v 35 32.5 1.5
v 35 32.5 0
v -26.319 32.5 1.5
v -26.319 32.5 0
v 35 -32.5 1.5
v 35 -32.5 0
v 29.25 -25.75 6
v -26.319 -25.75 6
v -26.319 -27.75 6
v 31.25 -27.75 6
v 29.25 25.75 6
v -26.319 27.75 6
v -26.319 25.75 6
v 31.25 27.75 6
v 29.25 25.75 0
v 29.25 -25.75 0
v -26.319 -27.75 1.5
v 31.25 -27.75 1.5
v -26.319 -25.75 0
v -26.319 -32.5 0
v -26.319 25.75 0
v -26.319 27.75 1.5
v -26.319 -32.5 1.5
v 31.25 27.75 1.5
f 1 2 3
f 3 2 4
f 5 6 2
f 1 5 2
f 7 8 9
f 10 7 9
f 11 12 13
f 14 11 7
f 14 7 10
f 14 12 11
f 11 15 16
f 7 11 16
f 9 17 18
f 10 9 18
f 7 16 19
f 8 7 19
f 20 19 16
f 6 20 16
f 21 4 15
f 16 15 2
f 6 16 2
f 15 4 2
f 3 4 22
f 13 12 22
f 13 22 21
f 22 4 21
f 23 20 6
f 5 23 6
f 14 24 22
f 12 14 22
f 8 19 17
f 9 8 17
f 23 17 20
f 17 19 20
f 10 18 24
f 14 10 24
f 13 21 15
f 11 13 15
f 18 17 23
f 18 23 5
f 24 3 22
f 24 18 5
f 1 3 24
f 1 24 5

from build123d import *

# Parameters (mm, degrees)
F1_DEPTH = 1.5
F2_DEPTH = 6


with BuildPart() as f1:
    # F0 (on Top) → F1 (new body)
    with BuildSketch(Plane.XY):
        Polygon((31.25, -27.75), (-26.318803, -27.75), (-26.318803, -32.5), (35, -32.5), (35, 32.5), (-26.318803, 32.5), (-26.318803, 27.75), (31.25, 27.75), align=None)
        Polygon((29.25, 25.75), (29.25, -25.75), (-26.318803, -25.75), (-26.318803, -27.75), (31.25, -27.75), (31.25, 27.75), (-26.318803, 27.75), (-26.318803, 25.75), align=None)
    extrude(amount=F1_DEPTH)

    # F0 (on Top) → F2 (join)
    with BuildSketch(Plane.XY):
        Polygon((29.25, 25.75), (29.25, -25.75), (-26.318803, -25.75), (-26.318803, -27.75), (31.25, -27.75), (31.25, 27.75), (-26.318803, 27.75), (-26.318803, 25.75), align=None)
    extrude(amount=F2_DEPTH)


solid = f1.part
